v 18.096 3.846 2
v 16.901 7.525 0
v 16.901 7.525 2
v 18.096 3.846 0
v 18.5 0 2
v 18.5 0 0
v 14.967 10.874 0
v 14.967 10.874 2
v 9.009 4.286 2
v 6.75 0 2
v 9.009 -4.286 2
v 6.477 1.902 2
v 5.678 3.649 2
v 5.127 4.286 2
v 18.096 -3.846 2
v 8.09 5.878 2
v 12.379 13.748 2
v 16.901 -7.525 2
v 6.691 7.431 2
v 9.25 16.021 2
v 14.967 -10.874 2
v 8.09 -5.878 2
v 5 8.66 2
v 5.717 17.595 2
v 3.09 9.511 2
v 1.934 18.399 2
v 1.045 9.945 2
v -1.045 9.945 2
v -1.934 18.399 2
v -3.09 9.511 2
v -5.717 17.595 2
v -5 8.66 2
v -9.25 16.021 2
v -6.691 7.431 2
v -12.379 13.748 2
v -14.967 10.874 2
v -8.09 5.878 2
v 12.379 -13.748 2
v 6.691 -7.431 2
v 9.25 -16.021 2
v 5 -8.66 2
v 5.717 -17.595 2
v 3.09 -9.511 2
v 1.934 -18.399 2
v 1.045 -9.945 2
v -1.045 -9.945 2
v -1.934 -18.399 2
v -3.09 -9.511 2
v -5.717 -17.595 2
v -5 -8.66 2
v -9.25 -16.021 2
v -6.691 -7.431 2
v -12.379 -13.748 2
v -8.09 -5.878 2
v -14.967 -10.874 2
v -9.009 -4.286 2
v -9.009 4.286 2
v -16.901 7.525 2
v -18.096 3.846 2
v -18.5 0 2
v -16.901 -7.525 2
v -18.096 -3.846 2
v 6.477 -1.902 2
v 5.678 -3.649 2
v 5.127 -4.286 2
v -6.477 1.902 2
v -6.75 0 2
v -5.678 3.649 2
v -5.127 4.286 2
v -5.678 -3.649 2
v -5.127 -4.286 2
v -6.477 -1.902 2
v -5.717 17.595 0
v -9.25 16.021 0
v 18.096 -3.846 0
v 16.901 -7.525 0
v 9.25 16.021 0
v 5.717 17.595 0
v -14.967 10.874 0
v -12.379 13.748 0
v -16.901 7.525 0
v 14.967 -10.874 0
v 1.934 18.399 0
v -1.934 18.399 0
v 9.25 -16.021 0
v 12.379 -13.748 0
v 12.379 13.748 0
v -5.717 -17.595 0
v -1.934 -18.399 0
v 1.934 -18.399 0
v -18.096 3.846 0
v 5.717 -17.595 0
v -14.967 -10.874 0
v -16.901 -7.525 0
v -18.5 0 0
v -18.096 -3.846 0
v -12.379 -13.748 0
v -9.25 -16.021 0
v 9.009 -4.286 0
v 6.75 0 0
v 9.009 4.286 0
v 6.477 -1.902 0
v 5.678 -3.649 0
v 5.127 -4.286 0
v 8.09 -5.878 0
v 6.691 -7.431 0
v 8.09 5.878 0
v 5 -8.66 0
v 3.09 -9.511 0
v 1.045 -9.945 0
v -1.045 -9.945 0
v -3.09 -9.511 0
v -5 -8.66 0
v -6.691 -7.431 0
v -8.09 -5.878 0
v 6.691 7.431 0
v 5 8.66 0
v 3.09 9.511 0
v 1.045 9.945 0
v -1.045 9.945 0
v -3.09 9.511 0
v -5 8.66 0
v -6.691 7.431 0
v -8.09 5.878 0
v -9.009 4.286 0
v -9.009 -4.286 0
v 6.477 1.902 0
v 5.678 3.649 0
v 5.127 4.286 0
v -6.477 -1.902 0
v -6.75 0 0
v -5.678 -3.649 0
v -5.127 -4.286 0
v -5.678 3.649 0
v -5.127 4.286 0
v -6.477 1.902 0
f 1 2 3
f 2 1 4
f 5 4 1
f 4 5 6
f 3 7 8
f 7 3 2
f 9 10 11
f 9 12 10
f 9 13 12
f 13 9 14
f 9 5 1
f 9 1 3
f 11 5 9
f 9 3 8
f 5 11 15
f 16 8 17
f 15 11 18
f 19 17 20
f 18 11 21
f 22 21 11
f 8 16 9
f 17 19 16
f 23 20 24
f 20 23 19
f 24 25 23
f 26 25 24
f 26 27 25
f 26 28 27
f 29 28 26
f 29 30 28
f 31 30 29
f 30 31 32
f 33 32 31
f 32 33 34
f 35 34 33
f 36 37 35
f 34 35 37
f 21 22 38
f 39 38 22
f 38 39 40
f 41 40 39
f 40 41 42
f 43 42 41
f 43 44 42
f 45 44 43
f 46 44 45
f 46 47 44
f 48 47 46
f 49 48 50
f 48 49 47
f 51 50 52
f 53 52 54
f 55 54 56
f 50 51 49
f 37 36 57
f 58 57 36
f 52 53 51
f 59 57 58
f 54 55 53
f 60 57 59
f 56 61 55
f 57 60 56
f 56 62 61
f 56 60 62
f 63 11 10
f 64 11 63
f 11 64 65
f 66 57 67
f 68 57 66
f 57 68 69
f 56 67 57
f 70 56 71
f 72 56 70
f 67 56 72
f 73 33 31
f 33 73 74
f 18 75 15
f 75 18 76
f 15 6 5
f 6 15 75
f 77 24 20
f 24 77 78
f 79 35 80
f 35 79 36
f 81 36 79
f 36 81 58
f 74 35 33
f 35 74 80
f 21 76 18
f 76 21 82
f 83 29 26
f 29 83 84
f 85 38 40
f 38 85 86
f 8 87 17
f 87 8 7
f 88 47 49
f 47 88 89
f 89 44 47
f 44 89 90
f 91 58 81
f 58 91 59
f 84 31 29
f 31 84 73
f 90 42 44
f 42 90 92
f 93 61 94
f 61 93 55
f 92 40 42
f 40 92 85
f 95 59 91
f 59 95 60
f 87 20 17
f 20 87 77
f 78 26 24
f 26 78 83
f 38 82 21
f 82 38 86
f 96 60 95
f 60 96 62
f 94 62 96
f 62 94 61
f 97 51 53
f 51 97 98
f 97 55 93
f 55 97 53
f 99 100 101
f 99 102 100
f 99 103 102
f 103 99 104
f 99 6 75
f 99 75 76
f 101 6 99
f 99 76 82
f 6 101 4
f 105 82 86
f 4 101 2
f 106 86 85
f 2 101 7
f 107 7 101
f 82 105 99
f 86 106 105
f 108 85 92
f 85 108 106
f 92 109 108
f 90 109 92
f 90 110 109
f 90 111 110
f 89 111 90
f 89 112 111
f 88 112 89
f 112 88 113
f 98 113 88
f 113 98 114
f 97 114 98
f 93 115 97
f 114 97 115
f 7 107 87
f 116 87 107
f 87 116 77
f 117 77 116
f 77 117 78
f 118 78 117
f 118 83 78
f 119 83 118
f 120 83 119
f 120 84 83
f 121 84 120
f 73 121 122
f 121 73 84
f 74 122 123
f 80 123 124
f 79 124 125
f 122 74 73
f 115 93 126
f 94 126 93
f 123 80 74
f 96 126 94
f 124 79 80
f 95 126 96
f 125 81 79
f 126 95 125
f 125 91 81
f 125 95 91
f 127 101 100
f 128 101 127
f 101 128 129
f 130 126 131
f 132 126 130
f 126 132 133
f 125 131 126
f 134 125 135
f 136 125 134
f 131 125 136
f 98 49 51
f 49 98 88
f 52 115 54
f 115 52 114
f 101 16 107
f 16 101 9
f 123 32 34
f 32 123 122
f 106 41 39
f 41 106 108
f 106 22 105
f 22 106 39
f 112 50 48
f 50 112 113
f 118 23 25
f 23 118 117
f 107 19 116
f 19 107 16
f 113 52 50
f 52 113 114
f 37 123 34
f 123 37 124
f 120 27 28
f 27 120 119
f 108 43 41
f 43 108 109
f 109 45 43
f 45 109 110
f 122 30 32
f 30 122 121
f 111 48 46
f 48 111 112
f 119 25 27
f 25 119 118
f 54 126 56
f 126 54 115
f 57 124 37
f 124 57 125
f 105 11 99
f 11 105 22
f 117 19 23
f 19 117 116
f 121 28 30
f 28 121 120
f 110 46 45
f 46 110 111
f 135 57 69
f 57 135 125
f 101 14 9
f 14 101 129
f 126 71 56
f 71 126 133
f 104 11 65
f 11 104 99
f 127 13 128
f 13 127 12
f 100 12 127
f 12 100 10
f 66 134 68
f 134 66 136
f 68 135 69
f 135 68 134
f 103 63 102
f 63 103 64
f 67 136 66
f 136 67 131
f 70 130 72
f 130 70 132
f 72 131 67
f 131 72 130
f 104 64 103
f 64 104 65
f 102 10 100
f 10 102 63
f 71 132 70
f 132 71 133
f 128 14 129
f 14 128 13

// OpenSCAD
thickness = 2;
base_diameter = 35;
core_diameter = 15;
attack_ring_diameter = base_diameter + thickness;

module attack_ring_base() {
    clip_length = base_diameter;
    clip_width = core_diameter / 1.75;

    difference() {
        cylinder(thickness, d = attack_ring_diameter);
        cylinder(thickness, d = core_diameter + 5);
    }
    difference() {
        translate([-clip_length / 2, -clip_width / 2])
        cube([clip_length, clip_width, thickness]);
        cylinder(thickness, d = core_diameter - thickness + 0.5);
    }
}

module with_base() {
    difference() {
        children();
        cylinder(thickness, attack_ring_diameter);
        cylinder(10, core_diameter);
    }
    attack_ring_base();
}

attack_ring_base();
